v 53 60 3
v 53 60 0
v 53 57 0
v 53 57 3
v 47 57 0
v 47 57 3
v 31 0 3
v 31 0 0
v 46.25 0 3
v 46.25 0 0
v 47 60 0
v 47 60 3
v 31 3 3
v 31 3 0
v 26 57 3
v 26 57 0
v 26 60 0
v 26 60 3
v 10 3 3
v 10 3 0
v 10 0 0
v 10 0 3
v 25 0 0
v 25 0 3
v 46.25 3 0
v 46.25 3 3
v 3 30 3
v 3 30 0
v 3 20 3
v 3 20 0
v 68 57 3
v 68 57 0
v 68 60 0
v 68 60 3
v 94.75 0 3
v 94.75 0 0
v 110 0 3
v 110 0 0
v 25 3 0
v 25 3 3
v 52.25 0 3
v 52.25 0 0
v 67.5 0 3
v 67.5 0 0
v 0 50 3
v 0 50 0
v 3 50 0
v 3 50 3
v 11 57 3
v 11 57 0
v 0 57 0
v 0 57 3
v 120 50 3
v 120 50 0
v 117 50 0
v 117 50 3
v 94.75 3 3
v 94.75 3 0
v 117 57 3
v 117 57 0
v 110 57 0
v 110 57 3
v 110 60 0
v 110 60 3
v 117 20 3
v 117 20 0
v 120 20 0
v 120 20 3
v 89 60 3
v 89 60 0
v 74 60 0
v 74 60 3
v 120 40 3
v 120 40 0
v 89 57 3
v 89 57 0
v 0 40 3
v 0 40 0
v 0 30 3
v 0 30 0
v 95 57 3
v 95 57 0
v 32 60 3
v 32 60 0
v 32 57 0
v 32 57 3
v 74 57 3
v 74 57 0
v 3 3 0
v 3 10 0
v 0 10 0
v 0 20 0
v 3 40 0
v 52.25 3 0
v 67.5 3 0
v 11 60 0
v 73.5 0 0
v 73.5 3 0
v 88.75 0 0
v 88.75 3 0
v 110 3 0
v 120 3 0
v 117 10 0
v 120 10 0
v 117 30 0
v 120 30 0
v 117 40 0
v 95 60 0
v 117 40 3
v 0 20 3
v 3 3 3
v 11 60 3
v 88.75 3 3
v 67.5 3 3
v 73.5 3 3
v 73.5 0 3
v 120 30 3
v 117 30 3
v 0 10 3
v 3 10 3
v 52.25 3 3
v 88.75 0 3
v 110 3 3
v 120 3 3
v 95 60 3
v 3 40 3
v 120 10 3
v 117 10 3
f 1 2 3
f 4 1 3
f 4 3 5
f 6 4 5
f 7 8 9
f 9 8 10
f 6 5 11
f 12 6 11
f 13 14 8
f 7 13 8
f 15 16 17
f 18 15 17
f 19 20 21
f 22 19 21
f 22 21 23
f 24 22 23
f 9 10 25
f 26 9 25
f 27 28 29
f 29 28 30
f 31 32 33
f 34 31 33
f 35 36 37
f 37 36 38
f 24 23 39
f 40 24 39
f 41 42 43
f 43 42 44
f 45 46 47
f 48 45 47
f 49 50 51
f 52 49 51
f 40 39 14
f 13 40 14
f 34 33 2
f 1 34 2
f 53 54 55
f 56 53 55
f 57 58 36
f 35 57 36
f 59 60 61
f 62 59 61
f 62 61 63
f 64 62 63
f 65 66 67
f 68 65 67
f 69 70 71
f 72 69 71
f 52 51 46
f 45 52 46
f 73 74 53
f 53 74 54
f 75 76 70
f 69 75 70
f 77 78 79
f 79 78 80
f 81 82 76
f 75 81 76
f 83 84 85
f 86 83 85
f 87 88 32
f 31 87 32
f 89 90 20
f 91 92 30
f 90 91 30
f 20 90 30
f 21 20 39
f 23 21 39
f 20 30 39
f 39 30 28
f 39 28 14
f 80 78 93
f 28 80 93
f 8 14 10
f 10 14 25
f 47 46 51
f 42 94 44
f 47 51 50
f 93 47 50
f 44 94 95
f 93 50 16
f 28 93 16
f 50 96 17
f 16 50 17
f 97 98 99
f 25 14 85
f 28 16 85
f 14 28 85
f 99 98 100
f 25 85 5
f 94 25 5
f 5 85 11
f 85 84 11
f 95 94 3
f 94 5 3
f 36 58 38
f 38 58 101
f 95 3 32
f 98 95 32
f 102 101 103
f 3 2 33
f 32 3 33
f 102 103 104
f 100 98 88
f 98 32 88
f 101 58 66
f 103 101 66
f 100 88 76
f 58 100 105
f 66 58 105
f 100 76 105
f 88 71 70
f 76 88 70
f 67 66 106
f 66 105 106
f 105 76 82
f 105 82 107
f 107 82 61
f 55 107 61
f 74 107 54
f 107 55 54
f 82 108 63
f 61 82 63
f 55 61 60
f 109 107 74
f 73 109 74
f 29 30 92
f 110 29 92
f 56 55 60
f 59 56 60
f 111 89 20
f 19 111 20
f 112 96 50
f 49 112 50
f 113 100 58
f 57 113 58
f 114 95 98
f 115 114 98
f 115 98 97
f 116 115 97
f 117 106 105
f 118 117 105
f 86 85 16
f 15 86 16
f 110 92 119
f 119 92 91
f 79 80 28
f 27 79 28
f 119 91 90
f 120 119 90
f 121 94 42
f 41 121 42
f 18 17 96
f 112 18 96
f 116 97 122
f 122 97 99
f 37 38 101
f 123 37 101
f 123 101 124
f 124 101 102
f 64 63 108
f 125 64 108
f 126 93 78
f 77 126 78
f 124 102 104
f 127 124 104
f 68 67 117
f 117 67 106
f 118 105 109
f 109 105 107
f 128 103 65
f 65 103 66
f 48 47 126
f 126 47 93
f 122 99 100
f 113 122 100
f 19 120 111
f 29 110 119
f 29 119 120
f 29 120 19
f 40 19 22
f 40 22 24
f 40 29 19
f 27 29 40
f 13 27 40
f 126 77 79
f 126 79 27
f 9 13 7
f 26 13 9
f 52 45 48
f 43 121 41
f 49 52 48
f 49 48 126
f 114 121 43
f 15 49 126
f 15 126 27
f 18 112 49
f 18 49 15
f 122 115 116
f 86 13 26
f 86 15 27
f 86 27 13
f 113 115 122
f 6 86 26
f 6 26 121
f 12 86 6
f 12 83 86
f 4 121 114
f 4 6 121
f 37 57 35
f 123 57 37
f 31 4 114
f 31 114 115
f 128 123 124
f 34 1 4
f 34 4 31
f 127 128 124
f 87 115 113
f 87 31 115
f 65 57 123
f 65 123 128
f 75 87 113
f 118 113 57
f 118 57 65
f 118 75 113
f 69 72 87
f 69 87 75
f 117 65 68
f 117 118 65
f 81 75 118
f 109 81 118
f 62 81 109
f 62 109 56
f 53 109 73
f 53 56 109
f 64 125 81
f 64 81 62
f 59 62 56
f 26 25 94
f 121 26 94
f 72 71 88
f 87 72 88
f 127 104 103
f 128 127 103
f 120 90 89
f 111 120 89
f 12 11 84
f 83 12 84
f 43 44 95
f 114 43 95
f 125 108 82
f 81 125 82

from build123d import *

# Parameters (mm, degrees)
BOSS_EXTRUDE1_DEPTH = 3


with BuildPart() as part:
    # Sketch1 → Boss-Extrude1 (new body)
    with BuildSketch(Plane.XY):
        Polygon((120, 3), (120, 10), (117, 10), (117, 20), (120, 20), (120, 30), (117, 30), (117, 40), (120, 40), (120, 50), (117, 50), (117, 57), (110, 57), (110, 60), (95, 60), (95, 57), (89, 57), (89, 60), (74, 60), (74, 57), (68, 57), (68, 60), (53, 60), (53, 57), (47, 57), (47, 60), (32, 60), (32, 57), (26, 57), (26, 60), (11, 60), (11, 57), (5, 57), (0, 57), (0, 50), (3, 50), (3, 40), (0, 40), (0, 30), (3, 30), (3, 20), (0, 20), (0, 10), (3, 10), (3, 3), (10, 3), (10, 0), (25, 0), (25, 3), (31, 3), (31, 0), (46.25, 0), (46.25, 3), (52.25, 3), (52.25, 0), (67.5, 0), (67.5, 3), (73.5, 3), (73.5, 0), (88.75, 0), (88.75, 3), (94.75, 3), (94.75, 0), (110, 0), (110, 3), (116, 3), align=None)
    extrude(amount=BOSS_EXTRUDE1_DEPTH)


solid = part.part
